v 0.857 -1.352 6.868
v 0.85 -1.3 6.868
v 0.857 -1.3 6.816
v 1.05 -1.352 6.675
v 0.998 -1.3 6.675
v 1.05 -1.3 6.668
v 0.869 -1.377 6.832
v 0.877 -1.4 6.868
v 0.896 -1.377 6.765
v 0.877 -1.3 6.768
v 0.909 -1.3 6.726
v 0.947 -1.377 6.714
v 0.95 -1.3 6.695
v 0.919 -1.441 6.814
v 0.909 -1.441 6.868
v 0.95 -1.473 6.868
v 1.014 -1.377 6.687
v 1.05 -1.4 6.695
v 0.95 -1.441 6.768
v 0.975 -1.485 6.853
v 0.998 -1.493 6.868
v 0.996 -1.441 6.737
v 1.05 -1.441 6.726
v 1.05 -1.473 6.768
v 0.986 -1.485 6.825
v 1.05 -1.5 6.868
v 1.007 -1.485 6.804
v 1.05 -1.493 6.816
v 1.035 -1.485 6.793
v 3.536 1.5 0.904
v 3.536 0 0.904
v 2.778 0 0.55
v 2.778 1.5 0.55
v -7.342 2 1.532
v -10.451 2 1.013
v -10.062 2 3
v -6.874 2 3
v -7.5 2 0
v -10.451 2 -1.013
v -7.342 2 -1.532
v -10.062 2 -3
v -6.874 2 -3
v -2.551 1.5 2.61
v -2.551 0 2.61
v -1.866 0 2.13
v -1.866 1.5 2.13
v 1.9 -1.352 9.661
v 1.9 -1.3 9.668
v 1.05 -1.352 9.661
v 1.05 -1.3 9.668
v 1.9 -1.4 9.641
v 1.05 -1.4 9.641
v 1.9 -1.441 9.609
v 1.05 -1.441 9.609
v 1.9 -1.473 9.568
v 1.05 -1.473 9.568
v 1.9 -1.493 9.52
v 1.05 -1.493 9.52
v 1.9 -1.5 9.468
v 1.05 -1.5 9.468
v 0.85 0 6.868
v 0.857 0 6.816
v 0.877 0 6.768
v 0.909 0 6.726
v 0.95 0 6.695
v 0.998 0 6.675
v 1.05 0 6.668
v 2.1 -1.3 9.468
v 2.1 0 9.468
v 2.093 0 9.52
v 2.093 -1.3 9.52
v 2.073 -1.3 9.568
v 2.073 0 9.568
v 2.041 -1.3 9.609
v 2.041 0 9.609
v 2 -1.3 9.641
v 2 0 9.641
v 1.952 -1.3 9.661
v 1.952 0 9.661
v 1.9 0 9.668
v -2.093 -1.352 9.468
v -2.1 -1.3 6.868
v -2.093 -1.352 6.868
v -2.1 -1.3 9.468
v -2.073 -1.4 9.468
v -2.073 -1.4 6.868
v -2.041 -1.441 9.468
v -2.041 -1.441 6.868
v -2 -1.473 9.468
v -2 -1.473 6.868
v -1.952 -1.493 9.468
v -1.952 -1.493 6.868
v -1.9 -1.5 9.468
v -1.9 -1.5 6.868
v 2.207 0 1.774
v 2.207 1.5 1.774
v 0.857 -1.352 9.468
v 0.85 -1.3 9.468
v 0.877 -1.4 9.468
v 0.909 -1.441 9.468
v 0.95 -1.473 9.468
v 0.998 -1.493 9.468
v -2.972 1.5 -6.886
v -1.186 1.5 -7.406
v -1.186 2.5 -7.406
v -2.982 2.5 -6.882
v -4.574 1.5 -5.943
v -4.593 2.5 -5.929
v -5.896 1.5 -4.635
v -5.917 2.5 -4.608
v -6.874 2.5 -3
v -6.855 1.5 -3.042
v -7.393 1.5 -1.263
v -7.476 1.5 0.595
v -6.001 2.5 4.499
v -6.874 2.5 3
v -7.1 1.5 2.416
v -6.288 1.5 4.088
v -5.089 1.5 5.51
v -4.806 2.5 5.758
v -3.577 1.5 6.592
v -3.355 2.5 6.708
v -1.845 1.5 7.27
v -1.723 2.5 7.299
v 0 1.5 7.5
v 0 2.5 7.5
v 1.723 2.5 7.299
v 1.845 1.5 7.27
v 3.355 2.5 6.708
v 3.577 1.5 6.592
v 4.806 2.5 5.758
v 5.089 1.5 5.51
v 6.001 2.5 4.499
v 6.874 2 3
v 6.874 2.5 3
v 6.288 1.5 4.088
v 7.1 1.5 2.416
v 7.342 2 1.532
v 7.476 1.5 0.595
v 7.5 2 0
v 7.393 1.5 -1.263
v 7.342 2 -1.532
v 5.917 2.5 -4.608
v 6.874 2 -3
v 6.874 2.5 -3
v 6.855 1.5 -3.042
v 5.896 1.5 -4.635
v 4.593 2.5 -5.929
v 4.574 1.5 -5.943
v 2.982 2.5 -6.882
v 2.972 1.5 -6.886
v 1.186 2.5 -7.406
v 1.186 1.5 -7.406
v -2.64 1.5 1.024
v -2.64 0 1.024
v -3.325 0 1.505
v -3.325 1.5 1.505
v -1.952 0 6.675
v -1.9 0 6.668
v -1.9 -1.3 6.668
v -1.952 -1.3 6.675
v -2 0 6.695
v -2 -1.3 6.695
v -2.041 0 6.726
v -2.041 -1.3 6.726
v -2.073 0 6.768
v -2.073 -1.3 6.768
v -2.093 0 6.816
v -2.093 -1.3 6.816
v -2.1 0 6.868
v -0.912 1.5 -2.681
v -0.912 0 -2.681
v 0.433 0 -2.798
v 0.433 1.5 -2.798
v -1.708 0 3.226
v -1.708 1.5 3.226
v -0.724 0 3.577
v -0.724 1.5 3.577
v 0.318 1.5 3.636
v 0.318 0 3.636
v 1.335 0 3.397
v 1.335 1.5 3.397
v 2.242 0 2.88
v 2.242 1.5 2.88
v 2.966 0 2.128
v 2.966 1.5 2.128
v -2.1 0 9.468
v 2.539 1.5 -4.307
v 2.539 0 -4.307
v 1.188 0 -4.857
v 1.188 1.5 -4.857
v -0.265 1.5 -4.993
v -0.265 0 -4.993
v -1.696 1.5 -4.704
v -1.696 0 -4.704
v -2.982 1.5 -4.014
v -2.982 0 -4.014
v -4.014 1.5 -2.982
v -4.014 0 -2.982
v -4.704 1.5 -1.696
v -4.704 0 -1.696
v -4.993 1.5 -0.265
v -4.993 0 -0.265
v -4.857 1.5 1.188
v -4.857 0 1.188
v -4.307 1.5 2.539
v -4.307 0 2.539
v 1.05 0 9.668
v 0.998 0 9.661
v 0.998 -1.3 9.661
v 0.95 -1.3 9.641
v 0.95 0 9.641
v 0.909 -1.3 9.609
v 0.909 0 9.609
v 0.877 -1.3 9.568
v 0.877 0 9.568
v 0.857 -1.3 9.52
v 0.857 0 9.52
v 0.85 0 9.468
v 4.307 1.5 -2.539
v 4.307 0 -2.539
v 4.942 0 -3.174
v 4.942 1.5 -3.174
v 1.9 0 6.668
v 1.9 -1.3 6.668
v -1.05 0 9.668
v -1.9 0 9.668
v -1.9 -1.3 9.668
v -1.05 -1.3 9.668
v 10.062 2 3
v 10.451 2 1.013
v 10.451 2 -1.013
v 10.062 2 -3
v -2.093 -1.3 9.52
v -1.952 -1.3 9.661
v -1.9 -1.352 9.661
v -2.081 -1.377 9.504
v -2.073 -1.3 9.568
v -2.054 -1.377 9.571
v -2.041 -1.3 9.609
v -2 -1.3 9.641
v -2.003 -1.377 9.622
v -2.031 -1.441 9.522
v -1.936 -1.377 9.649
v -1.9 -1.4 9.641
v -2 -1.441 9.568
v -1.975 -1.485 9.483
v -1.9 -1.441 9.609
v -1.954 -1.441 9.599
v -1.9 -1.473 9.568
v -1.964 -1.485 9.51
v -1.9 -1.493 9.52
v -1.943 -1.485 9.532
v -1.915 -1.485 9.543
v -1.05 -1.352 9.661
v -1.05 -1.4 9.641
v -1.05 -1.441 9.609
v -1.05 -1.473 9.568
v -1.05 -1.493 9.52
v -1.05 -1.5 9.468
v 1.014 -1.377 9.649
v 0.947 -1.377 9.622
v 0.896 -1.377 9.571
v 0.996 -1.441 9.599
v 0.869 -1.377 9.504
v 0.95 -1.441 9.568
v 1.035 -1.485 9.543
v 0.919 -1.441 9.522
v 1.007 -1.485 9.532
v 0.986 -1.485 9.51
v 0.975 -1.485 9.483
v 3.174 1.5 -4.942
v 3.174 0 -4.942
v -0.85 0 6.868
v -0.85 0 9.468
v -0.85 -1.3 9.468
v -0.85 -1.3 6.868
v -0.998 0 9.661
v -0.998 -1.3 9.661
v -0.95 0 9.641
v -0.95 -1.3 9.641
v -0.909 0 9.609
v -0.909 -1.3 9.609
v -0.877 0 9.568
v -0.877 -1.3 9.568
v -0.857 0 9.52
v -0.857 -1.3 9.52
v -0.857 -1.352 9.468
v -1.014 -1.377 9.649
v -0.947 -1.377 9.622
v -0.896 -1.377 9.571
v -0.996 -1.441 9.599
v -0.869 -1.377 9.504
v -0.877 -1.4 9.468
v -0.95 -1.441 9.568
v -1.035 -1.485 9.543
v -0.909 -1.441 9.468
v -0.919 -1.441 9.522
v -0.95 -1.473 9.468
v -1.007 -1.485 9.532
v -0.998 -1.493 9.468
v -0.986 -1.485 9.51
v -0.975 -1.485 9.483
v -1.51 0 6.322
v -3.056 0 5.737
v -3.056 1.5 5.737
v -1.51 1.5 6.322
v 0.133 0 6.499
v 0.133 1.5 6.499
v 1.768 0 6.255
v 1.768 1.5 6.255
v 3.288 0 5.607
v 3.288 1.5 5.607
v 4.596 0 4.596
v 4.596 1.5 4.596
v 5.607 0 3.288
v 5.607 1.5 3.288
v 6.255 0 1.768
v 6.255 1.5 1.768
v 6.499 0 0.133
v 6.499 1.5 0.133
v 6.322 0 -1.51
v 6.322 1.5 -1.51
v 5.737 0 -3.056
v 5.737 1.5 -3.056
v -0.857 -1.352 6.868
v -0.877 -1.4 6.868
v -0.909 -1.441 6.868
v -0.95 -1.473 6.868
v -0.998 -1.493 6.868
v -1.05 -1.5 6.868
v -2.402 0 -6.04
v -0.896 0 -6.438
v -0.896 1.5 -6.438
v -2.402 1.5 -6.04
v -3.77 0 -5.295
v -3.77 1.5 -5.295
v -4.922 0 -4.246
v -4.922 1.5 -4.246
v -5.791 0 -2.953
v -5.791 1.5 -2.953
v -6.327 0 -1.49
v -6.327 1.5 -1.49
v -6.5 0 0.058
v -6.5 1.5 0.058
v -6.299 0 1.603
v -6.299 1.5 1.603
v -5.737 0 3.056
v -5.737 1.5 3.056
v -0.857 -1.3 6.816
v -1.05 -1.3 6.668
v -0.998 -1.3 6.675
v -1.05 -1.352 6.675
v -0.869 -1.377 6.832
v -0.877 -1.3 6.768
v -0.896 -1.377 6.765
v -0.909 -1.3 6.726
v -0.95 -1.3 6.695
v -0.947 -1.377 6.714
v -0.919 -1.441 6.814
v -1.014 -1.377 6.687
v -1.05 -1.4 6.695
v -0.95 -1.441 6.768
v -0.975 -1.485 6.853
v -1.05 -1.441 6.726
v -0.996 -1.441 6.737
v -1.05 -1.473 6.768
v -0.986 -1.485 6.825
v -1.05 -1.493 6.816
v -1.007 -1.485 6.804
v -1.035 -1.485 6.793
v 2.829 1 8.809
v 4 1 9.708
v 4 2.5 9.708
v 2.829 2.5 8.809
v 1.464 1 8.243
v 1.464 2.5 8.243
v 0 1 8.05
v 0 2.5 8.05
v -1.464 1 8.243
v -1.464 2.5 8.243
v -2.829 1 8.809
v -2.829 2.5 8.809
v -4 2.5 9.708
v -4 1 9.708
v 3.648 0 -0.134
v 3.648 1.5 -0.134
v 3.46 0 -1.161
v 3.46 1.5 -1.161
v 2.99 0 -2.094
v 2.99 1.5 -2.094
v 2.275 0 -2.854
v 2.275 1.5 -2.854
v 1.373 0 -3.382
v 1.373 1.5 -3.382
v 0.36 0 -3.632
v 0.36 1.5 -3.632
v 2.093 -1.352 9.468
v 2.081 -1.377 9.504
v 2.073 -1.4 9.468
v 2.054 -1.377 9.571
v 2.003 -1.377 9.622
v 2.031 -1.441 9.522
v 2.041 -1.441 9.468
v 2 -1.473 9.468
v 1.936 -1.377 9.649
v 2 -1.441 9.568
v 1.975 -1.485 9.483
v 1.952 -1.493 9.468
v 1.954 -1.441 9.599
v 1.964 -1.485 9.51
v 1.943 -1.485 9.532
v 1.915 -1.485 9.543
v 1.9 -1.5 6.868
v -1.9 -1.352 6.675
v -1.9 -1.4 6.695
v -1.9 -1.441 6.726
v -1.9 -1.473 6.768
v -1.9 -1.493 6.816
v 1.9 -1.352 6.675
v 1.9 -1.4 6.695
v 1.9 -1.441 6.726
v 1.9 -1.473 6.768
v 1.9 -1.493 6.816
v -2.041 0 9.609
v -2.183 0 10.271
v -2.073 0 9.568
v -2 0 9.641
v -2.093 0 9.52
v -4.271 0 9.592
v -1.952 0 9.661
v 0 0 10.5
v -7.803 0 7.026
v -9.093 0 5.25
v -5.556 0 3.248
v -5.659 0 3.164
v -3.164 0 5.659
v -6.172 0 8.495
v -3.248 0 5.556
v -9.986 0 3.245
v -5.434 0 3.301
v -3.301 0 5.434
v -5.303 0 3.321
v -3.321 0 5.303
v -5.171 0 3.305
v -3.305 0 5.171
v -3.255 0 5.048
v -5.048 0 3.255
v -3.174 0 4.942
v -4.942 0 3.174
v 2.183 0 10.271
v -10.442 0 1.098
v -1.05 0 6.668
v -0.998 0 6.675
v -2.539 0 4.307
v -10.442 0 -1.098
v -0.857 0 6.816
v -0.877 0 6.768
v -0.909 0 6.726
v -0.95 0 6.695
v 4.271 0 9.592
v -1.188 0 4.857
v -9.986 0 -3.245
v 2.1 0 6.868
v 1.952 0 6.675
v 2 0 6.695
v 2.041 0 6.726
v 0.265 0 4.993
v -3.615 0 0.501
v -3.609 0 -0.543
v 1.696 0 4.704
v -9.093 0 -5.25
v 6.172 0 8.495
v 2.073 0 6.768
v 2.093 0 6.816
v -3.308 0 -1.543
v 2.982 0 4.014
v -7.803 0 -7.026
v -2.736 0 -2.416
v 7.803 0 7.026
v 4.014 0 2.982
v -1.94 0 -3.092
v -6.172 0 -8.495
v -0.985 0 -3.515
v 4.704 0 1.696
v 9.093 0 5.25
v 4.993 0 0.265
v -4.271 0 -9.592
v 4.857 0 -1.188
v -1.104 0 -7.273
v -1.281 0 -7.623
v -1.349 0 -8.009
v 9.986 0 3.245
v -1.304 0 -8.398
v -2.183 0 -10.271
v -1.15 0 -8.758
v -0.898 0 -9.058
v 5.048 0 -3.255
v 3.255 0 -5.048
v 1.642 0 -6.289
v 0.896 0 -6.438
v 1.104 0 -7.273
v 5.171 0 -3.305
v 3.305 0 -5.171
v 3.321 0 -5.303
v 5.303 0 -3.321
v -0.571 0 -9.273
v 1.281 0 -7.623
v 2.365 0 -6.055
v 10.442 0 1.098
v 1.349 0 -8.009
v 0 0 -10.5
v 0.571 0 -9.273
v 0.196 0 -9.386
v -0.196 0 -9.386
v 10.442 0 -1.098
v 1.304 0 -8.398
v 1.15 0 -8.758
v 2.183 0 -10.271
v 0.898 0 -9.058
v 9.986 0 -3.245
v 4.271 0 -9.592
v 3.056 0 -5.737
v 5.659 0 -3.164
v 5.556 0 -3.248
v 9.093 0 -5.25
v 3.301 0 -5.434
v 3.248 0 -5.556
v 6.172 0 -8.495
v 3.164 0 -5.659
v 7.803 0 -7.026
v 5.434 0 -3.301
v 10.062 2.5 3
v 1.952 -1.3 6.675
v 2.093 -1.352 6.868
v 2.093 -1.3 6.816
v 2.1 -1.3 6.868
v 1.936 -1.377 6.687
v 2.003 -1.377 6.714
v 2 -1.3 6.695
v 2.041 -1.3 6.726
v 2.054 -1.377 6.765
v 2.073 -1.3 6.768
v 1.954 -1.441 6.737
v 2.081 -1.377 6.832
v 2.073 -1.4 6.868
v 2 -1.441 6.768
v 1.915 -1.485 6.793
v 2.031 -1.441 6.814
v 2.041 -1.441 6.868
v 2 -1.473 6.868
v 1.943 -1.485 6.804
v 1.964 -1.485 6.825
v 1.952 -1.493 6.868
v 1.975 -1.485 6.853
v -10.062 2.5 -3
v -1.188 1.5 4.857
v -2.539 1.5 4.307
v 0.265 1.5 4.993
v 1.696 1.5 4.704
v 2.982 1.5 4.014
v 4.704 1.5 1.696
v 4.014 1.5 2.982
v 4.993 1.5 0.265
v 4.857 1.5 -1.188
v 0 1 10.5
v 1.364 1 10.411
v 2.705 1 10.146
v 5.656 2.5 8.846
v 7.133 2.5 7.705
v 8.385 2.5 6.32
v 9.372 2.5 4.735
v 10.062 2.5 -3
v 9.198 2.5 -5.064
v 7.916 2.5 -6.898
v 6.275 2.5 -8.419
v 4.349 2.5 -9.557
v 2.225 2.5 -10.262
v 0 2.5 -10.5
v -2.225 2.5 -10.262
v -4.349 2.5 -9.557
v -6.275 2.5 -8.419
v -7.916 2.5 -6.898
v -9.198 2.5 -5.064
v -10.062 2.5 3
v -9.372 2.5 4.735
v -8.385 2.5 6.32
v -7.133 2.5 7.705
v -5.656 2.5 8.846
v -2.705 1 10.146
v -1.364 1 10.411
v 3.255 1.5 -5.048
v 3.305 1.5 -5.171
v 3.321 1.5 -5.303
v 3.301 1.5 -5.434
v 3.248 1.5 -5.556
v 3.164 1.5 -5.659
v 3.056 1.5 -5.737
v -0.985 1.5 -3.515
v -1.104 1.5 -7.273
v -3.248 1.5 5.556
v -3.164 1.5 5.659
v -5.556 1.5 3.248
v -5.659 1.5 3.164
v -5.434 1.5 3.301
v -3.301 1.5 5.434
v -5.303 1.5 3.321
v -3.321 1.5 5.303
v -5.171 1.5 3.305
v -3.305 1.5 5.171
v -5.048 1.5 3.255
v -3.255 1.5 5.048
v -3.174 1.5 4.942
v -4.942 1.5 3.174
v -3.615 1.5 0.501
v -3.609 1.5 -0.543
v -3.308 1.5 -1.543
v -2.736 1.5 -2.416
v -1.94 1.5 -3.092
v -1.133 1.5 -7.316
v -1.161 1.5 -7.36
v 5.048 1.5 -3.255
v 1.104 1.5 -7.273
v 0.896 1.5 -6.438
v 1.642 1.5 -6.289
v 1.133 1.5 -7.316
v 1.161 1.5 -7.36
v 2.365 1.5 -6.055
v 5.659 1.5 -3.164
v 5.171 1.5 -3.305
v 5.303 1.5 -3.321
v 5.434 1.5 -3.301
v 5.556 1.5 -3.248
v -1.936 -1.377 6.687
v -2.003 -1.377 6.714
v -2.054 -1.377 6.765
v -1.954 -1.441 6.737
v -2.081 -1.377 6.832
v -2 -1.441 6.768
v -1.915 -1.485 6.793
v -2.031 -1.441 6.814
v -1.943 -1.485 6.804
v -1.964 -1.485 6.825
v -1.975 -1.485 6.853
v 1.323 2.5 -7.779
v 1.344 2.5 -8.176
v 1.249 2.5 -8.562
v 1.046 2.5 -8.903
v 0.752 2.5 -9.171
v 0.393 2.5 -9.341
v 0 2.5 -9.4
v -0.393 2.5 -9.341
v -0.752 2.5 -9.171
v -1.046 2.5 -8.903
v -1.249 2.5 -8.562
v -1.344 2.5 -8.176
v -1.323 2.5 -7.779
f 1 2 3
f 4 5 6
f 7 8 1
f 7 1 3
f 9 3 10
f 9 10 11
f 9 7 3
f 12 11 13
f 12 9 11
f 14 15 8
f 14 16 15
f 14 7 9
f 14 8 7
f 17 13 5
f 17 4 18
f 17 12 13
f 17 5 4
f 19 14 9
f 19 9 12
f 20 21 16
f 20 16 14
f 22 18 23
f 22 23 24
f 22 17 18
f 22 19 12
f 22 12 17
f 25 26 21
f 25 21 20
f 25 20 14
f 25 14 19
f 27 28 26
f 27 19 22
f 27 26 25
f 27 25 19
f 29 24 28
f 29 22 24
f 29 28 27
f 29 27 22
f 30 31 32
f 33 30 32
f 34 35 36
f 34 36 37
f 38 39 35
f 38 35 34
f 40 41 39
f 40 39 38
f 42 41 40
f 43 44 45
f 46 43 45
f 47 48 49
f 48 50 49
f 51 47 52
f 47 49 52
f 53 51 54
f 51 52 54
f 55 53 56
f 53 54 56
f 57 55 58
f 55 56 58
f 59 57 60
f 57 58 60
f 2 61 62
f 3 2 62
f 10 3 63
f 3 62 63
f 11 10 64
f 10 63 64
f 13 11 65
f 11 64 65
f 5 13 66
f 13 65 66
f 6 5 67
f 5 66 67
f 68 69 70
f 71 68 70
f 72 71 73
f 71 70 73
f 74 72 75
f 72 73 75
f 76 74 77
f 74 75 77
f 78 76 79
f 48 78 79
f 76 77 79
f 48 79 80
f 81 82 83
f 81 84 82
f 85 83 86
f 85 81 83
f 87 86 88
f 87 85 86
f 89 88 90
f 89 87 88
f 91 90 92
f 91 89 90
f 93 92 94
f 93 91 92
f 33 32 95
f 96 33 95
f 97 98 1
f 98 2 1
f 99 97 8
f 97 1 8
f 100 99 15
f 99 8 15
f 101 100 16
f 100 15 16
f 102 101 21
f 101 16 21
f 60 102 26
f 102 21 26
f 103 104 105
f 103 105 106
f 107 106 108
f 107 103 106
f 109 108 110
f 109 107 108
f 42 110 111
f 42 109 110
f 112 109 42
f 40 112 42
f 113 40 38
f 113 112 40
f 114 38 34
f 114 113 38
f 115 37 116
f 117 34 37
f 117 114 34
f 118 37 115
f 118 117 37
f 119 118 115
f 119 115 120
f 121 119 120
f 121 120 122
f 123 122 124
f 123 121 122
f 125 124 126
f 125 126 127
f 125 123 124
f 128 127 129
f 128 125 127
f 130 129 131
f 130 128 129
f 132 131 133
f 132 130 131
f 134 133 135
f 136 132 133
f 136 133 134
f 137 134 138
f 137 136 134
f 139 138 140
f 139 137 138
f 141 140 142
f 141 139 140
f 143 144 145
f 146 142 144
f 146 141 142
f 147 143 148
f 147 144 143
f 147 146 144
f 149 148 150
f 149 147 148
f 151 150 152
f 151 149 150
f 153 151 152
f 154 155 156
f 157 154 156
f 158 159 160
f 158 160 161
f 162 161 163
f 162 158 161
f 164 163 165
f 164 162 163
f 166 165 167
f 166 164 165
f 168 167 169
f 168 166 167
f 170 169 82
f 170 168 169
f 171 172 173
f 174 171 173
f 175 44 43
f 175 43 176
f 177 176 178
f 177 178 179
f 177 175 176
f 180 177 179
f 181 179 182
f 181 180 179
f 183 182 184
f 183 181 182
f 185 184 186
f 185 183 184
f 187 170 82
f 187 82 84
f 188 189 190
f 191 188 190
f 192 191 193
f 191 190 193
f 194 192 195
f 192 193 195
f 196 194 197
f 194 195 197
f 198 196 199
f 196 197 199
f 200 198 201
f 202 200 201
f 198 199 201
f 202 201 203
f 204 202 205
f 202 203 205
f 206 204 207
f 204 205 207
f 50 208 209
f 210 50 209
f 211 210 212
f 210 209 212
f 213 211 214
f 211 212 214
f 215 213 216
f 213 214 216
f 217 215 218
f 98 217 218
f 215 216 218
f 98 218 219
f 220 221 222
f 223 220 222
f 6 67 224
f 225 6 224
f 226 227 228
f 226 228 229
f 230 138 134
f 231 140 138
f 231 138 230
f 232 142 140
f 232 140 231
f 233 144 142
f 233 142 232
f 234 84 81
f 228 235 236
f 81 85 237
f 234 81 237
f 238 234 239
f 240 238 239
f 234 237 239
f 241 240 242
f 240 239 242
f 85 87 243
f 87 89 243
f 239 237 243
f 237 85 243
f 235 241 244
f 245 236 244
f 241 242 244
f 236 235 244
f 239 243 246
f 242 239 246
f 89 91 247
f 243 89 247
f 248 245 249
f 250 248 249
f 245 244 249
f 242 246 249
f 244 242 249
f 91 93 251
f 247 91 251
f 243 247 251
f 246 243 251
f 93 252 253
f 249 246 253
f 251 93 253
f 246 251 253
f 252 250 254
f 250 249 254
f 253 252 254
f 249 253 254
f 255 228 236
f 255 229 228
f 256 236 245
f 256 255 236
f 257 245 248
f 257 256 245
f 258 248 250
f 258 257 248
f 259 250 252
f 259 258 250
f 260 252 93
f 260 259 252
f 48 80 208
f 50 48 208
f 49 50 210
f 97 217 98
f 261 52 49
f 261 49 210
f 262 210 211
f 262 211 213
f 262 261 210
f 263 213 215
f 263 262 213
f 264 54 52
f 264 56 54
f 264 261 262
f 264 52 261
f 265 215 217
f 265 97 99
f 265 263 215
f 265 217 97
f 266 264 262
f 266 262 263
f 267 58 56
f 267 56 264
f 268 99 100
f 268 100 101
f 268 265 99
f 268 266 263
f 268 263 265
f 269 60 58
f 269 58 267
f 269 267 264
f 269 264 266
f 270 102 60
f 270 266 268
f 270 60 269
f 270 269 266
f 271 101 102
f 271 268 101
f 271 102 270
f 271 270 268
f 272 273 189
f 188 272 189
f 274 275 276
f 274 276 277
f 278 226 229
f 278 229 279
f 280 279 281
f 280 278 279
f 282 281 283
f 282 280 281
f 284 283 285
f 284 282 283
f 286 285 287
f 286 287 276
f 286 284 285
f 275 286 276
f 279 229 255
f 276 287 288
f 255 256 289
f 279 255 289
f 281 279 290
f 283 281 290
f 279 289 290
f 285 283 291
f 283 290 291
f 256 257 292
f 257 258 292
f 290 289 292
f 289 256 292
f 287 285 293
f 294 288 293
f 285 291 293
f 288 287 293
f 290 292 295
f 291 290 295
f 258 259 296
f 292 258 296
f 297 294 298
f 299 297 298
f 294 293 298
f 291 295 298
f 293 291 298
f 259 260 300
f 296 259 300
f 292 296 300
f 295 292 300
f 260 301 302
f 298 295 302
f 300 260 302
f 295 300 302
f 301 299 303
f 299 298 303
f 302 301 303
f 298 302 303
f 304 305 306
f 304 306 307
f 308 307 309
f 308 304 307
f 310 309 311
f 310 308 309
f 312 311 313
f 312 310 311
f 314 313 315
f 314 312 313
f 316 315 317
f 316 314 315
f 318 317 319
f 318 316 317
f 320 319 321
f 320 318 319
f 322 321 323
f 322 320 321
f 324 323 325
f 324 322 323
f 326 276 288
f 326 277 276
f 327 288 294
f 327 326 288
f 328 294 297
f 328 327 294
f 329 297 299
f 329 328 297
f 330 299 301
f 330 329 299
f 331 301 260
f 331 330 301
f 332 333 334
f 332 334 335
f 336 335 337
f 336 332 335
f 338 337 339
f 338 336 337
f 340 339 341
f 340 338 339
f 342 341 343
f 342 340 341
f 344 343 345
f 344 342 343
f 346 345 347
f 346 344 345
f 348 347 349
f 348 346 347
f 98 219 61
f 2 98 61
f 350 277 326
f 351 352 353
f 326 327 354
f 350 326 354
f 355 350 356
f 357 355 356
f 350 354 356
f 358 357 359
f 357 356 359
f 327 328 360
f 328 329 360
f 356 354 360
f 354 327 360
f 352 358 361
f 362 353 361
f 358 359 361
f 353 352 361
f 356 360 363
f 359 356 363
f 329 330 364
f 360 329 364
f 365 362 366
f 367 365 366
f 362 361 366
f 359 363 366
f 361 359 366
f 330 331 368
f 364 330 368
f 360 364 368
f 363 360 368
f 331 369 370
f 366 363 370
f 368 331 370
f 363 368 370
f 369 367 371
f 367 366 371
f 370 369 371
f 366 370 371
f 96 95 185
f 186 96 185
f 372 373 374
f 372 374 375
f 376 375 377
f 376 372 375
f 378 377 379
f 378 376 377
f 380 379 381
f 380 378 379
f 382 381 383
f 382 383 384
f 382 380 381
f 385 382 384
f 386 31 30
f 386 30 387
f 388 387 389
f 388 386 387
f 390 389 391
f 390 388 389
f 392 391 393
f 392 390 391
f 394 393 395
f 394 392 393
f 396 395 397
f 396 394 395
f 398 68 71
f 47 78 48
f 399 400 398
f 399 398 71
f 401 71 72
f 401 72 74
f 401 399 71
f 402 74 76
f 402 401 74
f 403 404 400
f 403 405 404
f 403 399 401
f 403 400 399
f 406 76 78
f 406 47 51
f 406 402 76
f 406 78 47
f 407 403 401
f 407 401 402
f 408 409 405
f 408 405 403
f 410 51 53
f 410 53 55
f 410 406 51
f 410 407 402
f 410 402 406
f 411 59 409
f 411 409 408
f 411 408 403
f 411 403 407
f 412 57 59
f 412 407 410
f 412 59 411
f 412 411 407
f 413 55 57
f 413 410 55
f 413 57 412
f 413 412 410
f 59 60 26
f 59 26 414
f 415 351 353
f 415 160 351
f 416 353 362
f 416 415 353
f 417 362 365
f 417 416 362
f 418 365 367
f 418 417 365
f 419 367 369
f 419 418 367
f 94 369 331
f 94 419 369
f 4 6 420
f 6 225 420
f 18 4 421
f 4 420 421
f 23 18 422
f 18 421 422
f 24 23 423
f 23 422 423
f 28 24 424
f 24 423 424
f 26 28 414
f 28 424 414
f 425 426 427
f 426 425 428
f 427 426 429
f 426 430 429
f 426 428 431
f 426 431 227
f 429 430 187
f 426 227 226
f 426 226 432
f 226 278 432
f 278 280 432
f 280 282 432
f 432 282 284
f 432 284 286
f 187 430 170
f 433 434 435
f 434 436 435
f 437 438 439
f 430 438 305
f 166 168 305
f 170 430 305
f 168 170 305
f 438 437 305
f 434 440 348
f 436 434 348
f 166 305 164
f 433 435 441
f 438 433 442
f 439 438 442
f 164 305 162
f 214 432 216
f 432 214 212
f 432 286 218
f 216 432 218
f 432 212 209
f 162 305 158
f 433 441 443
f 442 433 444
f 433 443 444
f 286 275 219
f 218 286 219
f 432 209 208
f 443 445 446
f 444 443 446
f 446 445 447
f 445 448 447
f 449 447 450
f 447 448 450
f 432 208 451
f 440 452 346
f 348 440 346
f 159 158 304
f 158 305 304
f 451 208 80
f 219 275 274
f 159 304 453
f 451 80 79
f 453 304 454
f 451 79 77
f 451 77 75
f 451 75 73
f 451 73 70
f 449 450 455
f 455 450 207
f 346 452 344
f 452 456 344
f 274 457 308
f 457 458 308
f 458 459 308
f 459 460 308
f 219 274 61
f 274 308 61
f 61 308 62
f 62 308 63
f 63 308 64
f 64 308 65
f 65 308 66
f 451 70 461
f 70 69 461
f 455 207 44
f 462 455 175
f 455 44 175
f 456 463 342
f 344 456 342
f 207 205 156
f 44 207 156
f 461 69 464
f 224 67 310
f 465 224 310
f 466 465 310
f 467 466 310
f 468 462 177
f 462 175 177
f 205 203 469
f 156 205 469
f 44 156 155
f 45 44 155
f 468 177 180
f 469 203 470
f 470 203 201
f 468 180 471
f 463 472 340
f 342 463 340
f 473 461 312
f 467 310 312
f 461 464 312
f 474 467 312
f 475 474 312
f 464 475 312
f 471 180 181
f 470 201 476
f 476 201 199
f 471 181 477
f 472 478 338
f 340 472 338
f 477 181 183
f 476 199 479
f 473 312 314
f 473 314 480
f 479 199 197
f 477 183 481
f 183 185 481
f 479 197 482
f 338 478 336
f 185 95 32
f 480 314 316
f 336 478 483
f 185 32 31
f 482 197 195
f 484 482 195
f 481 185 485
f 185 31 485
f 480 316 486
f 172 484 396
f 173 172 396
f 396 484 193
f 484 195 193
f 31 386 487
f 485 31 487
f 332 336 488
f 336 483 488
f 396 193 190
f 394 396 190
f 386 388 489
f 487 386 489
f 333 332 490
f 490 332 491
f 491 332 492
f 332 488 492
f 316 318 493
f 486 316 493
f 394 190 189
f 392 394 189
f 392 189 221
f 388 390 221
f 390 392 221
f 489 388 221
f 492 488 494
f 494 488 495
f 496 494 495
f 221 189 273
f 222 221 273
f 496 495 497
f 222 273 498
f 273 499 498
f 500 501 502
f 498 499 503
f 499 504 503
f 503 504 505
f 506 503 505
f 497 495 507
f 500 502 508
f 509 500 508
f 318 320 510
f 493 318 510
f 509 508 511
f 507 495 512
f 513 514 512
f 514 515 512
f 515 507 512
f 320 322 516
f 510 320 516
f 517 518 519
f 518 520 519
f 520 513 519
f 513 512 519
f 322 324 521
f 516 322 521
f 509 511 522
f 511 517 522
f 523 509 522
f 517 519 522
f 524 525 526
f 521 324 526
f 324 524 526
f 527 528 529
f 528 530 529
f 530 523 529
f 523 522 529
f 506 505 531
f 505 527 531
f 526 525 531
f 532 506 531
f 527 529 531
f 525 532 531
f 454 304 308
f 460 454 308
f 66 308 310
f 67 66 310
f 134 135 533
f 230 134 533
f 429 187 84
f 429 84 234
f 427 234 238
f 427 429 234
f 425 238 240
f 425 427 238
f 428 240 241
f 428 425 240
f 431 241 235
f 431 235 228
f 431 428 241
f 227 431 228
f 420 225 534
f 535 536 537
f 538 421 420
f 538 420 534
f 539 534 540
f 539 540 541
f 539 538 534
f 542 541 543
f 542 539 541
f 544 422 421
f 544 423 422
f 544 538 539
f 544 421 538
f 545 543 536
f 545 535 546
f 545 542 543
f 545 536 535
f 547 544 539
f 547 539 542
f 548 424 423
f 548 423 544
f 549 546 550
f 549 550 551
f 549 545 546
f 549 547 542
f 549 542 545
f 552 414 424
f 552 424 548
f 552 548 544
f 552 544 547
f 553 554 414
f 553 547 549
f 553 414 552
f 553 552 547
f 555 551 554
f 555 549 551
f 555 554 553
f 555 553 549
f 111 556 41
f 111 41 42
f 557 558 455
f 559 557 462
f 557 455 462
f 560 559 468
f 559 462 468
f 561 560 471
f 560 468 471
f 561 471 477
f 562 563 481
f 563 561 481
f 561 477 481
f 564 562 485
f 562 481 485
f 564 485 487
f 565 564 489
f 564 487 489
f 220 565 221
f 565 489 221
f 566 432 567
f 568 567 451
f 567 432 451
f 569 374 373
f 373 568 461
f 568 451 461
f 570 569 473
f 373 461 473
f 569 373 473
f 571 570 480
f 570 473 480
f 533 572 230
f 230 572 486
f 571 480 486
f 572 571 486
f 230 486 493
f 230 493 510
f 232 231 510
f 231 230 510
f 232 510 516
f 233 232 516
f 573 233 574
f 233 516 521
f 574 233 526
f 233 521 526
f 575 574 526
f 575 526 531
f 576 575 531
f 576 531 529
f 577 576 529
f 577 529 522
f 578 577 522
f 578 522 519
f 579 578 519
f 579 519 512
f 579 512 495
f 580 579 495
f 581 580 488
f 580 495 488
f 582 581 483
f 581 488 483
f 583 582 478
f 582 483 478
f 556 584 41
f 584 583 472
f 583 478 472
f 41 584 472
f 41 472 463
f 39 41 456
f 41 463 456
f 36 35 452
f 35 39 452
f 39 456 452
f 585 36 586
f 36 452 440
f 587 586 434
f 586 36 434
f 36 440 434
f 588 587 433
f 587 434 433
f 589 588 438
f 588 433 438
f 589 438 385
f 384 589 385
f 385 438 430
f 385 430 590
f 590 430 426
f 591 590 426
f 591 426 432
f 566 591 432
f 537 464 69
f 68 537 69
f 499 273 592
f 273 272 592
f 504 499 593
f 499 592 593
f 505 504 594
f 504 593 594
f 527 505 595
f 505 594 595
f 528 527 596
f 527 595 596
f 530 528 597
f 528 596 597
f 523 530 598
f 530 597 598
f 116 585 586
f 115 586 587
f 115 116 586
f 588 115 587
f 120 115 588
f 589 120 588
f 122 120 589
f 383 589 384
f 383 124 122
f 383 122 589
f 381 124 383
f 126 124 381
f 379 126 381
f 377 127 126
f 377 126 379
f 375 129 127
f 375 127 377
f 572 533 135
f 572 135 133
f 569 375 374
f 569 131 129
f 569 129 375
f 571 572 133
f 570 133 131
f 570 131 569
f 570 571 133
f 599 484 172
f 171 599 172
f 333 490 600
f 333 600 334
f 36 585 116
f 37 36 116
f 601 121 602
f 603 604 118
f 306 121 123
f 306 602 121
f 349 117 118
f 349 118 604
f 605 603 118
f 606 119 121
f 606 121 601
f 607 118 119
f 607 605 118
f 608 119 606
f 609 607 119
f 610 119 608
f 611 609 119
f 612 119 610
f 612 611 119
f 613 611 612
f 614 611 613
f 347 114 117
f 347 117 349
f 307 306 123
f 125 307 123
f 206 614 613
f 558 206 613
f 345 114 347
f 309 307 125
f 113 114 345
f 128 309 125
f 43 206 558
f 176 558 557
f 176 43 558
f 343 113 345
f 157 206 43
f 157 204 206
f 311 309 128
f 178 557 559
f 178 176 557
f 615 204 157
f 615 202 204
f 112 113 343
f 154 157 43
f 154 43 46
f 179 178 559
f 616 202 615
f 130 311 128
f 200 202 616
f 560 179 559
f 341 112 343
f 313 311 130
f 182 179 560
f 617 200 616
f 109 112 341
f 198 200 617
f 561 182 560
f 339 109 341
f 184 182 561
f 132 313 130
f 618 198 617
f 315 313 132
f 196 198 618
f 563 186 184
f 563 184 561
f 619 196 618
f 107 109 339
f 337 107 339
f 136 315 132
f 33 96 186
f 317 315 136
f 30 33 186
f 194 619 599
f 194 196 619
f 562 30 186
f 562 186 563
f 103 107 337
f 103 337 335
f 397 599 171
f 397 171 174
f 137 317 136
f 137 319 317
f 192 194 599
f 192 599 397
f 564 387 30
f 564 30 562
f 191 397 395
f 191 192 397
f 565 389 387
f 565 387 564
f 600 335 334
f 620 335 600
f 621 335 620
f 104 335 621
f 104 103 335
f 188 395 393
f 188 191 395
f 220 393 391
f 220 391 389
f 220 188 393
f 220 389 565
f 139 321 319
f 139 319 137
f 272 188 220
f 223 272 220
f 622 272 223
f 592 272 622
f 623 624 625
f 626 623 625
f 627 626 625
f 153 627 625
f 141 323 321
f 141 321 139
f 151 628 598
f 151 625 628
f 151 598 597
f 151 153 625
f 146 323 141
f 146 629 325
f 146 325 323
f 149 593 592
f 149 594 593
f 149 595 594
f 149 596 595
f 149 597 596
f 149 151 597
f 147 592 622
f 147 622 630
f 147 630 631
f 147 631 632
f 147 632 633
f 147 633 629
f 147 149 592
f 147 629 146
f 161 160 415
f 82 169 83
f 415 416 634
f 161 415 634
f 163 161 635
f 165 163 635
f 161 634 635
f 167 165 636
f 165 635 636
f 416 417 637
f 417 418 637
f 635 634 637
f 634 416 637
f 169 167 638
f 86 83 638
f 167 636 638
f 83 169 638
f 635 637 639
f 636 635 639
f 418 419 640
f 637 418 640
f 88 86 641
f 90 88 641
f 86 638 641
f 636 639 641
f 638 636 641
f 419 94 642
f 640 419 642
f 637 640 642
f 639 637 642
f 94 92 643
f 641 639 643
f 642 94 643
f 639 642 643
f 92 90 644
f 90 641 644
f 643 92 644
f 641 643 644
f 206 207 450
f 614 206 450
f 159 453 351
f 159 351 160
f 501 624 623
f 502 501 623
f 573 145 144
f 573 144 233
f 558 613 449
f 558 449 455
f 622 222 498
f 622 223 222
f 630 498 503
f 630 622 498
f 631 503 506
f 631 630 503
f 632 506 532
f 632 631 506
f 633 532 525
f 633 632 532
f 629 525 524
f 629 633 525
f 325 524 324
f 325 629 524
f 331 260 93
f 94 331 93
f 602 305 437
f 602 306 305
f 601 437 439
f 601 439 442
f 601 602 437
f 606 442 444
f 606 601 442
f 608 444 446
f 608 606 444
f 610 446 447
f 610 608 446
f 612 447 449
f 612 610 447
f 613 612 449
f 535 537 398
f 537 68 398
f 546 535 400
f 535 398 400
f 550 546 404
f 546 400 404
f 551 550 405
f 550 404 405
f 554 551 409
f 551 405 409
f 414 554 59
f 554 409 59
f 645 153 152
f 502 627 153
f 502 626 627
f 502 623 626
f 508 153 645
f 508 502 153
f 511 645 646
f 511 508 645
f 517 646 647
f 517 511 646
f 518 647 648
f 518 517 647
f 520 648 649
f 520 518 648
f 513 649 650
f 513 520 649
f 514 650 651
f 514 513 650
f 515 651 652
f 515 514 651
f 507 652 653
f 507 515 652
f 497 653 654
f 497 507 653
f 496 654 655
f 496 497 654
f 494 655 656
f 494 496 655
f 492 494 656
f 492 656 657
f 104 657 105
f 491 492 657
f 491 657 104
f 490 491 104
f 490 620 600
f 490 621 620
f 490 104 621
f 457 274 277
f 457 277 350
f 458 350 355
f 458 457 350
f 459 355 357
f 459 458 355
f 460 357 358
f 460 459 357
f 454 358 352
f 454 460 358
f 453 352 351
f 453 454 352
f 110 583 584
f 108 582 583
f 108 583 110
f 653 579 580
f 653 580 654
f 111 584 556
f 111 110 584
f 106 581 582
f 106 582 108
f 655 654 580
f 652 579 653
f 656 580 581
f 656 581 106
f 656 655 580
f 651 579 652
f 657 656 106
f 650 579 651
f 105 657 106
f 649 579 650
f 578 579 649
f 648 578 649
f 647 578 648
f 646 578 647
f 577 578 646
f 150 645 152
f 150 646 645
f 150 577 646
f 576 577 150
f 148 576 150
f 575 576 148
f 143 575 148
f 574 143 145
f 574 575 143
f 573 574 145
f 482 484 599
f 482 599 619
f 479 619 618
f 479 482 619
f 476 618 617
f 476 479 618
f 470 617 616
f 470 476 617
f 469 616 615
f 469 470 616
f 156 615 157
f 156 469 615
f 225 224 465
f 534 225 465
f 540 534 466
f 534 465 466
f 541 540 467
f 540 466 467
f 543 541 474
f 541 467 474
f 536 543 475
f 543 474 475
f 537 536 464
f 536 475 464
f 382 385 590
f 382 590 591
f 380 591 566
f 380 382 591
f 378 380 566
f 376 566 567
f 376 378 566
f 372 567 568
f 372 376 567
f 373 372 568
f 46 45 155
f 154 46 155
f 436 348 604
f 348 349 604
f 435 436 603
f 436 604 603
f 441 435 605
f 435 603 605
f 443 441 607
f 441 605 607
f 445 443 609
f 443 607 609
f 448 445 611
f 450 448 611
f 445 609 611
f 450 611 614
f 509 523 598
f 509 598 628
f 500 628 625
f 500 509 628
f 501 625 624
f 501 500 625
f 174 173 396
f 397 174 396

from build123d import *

# Parameters (mm, degrees)
SKETCH2_R           = 10.5
SKETCH2_R_2         = 7.5
BOSS_EXTRUDE1_DEPTH = 2.5
SKETCH2_3_R         = 7.5
SKETCH2_3_R_2       = 6.5
BOSS_EXTRUDE2_DEPTH = 1.5
SKETCH3_W           = 30
SKETCH3_H           = 6
CUT_EXTRUDE1_DEPTH  = 0.5
CUT_EXTRUDE2_START  = -1.5
CUT_EXTRUDE2_DEPTH  = 1.5
SKETCH5_R           = 5
SKETCH5_R_2         = 3.65
BOSS_EXTRUDE3_DEPTH = 1.5
FILLET1_R           = 0.5
CUT_EXTRUDE3_START  = -2.5
CUT_EXTRUDE3_DEPTH  = 2.5
BOSS_EXTRUDE4_DEPTH = 1.5
FILLET2_R           = 0.2


# Read off the part's stored shape, not the designer's step: Cut-Extrude3
with BuildPart() as part:
    # Sketch2 → Boss-Extrude1 (new body)
    with BuildSketch(Plane(origin=(0, 0, 0), x_dir=(1, 0, 0), z_dir=(0, 1, 0))):
        with Locations(Location((0, 0, 0), (0, 0, 270))):
            Circle(SKETCH2_R)
        with Locations(Location((0, 0, 0), (0, 0, 270))):
            Circle(SKETCH2_R_2, mode=Mode.SUBTRACT)
    extrude(amount=BOSS_EXTRUDE1_DEPTH)

    # Sketch2<3> → Boss-Extrude2 (add)
    with BuildSketch(Plane(origin=(0, 0, 0), x_dir=(1, 0, 0), z_dir=(0, 1, 0))):
        with Locations(Location((0, 0, 0), (0, 0, 270))):
            Circle(SKETCH2_3_R)
        with Locations(Location((0, 0, 0), (0, 0, 270))):
            Circle(SKETCH2_3_R_2, mode=Mode.SUBTRACT)
    extrude(amount=BOSS_EXTRUDE2_DEPTH)

    # Sketch3 → Cut-Extrude1 (cut)
    with BuildSketch(Plane(origin=(0, 2.5, 0), x_dir=(1, 0, 0), z_dir=(0, 1, 0))):
        Rectangle(SKETCH3_W, SKETCH3_H)
    extrude(amount=-CUT_EXTRUDE1_DEPTH, mode=Mode.SUBTRACT)

    # Sketch4 → Cut-Extrude2 (cut)
    with BuildSketch(Plane(origin=(0, 2.5, 0), x_dir=(1, 0, 0), z_dir=(0, 1, 0)).offset(CUT_EXTRUDE2_START)):
        with BuildLine():
            Line((-4, -9.708243919), (4, -9.708243919))
            ThreePointArc((4, -9.708243919), (0, -8.05), (-4, -9.708243919))
        make_face()
        with BuildLine():
            ThreePointArc((-4, -9.708243919), (0, -10.5), (4, -9.708243919))
            Line((4, -9.708243919), (-4, -9.708243919))
        make_face()
    extrude(amount=CUT_EXTRUDE2_DEPTH, mode=Mode.SUBTRACT)

    # Sketch5 → Boss-Extrude3 (add)
    # profile 1 of 6: a face of its own
    with BuildSketch(Plane(origin=(0, 0, 0), x_dir=(1, 0, 0), z_dir=(0, 1, 0))):
        Circle(SKETCH5_R)
        Circle(SKETCH5_R_2, mode=Mode.SUBTRACT)
    # profile 2 of 6: a face of its own
    with BuildSketch(Plane(origin=(0, 0, 0), x_dir=(1, 0, 0), z_dir=(0, 1, 0))):
        with BuildLine():
            Line((-4.307149461, -2.539382508), (-5.394288115, -3.626521162))
            ThreePointArc((-5.394288115, -3.626521162), (-4.596194078, -4.596194078), (-3.626521162, -5.394288115))
            Line((-3.626521162, -5.394288115), (-2.539382508, -4.307149461))
            ThreePointArc((-2.539382508, -4.307149461), (-3.535533906, -3.535533906), (-4.307149461, -2.539382508))
        make_face()
    # profile 3 of 6: a face of its own
    with BuildSketch(Plane(origin=(0, 0, 0), x_dir=(1, 0, 0), z_dir=(0, 1, 0))):
        with BuildLine():
            ThreePointArc((2.965697363, -2.127707487), (3.308023423, -1.542556655), (3.536232016, -0.904191975))
            Line((3.536232016, -0.904191975), (2.777613741, -0.550442464))
            Line((2.777613741, -0.550442464), (2.207079088, -1.773957976))
            Line((2.207079088, -1.773957976), (2.965697363, -2.127707487))
        make_face()
    # profile 4 of 6: a face of its own
    with BuildSketch(Plane(origin=(0, 0, 0), x_dir=(1, 0, 0), z_dir=(0, 1, 0))):
        with BuildLine():
            Line((-2.639832216, -1.02440757), (-3.325497417, -1.504515512))
            ThreePointArc((-3.325497417, -1.504515512), (-2.989904962, -2.093553993), (-2.551169228, -2.610370772))
            Line((-2.551169228, -2.610370772), (-1.865504027, -2.13026283))
            Line((-1.865504027, -2.13026283), (-2.639832216, -1.02440757))
        make_face()
    # profile 5 of 6: a face of its own
    with BuildSketch(Plane(origin=(0, 0, 0), x_dir=(1, 0, 0), z_dir=(0, 1, 0))):
        with BuildLine():
            Line((0.432753129, 2.798365546), (0.359800054, 3.632223))
            ThreePointArc((0.359800054, 3.632223), (-0.318118461, 3.636110648), (-0.985062788, 3.514562747))
            Line((-0.985062788, 3.514562747), (-0.912109714, 2.680705293))
            Line((-0.912109714, 2.680705293), (0.432753129, 2.798365546))
        make_face()
    # profile 6 of 6: a face of its own
    with BuildSketch(Plane(origin=(0, 0, 0), x_dir=(1, 0, 0), z_dir=(0, 1, 0))):
        with BuildLine():
            ThreePointArc((5.394288115, 3.626521162), (4.596194078, 4.596194078), (3.626521162, 5.394288115))
            Line((3.626521162, 5.394288115), (2.539382508, 4.307149461))
            ThreePointArc((2.539382508, 4.307149461), (3.535533906, 3.535533906), (4.307149461, 2.539382508))
            Line((4.307149461, 2.539382508), (5.394288115, 3.626521162))
        make_face()
    extrude(amount=BOSS_EXTRUDE3_DEPTH)

    # Fillet1
    fillet1_edges = [part.edges().sort_by_distance(p)[0] for p in [
        (5.394288115, 0.75, -3.626521162),
        (3.626521162, 0.75, -5.394288115),
        (-5.394288115, 0.75, 3.626521162),
        (-3.626521162, 0.75, 5.394288115),
    ]]
    fillet(fillet1_edges, radius=FILLET1_R)

    # Cut-Extrude3 outline → Cut-Extrude3 (cut)
    with BuildSketch(Plane(origin=(0, 2.5, 0), x_dir=(1, 0, 0), z_dir=(0, 1, 0)).offset(CUT_EXTRUDE3_START)):
        with BuildLine():
            Line((-1.104124308, 7.273205617), (-0.895875692, 6.437966041))
            ThreePointArc((-0.895875692, 6.437966041), (0, 6.5), (0.895875692, 6.437966041))
            Line((0.895875692, 6.437966041), (1.104124308, 7.273205617))
            ThreePointArc((1.104124308, 7.273205617), (0, 9.4), (-1.104124308, 7.273205617))
        make_face()
    extrude(amount=CUT_EXTRUDE3_DEPTH, mode=Mode.SUBTRACT)

    # Sketch7 → Boss-Extrude4 (add)
    with BuildSketch(Plane.XZ):
        with BuildLine():
            Line((1.05, 6.667886814), (1.9, 6.667886814))
            ThreePointArc((1.9, 6.667886814), (2.041421356, 6.726465457), (2.1, 6.867886814))
            Line((2.1, 6.867886814), (2.1, 9.467886814))
            ThreePointArc((2.1, 9.467886814), (2.041421356, 9.60930817), (1.9, 9.667886814))
            Line((1.9, 9.667886814), (1.05, 9.667886814))
            ThreePointArc((1.05, 9.667886814), (0.908578644, 9.60930817), (0.85, 9.467886814))
            Line((0.85, 9.467886814), (0.85, 6.867886814))
            ThreePointArc((0.85, 6.867886814), (0.908578644, 6.726465457), (1.05, 6.667886814))
        make_face()
        with BuildLine():
            Line((-2.1, 6.867886814), (-2.1, 9.467886814))
            ThreePointArc((-2.1, 9.467886814), (-2.041421356, 9.60930817), (-1.9, 9.667886814))
            Line((-1.9, 9.667886814), (-1.05, 9.667886814))
            ThreePointArc((-1.05, 9.667886814), (-0.908578644, 9.60930817), (-0.85, 9.467886814))
            Line((-0.85, 9.467886814), (-0.85, 6.867886814))
            ThreePointArc((-0.85, 6.867886814), (-0.908578644, 6.726465457), (-1.05, 6.667886814))
            Line((-1.05, 6.667886814), (-1.9, 6.667886814))
            ThreePointArc((-1.9, 6.667886814), (-2.041421356, 6.726465457), (-2.1, 6.867886814))
        make_face()
    extrude(amount=BOSS_EXTRUDE4_DEPTH)

    # Fillet2
    fillet2_edges = [part.edges().sort_by_distance(p)[0] for p in [
        (2.041421356, -1.5, 6.726465457),
        (2.1, -1.5, 8.167886814),
        (2.041421356, -1.5, 9.60930817),
        (1.475, -1.5, 9.667886814),
        (0.908578644, -1.5, 9.60930817),
        (0.85, -1.5, 8.167886814),
        (0.908578644, -1.5, 6.726465457),
        (1.475, -1.5, 6.667886814),
        (-0.908578644, -1.5, 9.60930817),
        (-1.475, -1.5, 9.667886814),
        (-2.041421356, -1.5, 9.60930817),
        (-2.1, -1.5, 8.167886814),
        (-2.041421356, -1.5, 6.726465457),
        (-1.475, -1.5, 6.667886814),
        (-0.908578644, -1.5, 6.726465457),
        (-0.85, -1.5, 8.167886814),
    ]]
    fillet(fillet2_edges, radius=FILLET2_R)


solid = part.part
